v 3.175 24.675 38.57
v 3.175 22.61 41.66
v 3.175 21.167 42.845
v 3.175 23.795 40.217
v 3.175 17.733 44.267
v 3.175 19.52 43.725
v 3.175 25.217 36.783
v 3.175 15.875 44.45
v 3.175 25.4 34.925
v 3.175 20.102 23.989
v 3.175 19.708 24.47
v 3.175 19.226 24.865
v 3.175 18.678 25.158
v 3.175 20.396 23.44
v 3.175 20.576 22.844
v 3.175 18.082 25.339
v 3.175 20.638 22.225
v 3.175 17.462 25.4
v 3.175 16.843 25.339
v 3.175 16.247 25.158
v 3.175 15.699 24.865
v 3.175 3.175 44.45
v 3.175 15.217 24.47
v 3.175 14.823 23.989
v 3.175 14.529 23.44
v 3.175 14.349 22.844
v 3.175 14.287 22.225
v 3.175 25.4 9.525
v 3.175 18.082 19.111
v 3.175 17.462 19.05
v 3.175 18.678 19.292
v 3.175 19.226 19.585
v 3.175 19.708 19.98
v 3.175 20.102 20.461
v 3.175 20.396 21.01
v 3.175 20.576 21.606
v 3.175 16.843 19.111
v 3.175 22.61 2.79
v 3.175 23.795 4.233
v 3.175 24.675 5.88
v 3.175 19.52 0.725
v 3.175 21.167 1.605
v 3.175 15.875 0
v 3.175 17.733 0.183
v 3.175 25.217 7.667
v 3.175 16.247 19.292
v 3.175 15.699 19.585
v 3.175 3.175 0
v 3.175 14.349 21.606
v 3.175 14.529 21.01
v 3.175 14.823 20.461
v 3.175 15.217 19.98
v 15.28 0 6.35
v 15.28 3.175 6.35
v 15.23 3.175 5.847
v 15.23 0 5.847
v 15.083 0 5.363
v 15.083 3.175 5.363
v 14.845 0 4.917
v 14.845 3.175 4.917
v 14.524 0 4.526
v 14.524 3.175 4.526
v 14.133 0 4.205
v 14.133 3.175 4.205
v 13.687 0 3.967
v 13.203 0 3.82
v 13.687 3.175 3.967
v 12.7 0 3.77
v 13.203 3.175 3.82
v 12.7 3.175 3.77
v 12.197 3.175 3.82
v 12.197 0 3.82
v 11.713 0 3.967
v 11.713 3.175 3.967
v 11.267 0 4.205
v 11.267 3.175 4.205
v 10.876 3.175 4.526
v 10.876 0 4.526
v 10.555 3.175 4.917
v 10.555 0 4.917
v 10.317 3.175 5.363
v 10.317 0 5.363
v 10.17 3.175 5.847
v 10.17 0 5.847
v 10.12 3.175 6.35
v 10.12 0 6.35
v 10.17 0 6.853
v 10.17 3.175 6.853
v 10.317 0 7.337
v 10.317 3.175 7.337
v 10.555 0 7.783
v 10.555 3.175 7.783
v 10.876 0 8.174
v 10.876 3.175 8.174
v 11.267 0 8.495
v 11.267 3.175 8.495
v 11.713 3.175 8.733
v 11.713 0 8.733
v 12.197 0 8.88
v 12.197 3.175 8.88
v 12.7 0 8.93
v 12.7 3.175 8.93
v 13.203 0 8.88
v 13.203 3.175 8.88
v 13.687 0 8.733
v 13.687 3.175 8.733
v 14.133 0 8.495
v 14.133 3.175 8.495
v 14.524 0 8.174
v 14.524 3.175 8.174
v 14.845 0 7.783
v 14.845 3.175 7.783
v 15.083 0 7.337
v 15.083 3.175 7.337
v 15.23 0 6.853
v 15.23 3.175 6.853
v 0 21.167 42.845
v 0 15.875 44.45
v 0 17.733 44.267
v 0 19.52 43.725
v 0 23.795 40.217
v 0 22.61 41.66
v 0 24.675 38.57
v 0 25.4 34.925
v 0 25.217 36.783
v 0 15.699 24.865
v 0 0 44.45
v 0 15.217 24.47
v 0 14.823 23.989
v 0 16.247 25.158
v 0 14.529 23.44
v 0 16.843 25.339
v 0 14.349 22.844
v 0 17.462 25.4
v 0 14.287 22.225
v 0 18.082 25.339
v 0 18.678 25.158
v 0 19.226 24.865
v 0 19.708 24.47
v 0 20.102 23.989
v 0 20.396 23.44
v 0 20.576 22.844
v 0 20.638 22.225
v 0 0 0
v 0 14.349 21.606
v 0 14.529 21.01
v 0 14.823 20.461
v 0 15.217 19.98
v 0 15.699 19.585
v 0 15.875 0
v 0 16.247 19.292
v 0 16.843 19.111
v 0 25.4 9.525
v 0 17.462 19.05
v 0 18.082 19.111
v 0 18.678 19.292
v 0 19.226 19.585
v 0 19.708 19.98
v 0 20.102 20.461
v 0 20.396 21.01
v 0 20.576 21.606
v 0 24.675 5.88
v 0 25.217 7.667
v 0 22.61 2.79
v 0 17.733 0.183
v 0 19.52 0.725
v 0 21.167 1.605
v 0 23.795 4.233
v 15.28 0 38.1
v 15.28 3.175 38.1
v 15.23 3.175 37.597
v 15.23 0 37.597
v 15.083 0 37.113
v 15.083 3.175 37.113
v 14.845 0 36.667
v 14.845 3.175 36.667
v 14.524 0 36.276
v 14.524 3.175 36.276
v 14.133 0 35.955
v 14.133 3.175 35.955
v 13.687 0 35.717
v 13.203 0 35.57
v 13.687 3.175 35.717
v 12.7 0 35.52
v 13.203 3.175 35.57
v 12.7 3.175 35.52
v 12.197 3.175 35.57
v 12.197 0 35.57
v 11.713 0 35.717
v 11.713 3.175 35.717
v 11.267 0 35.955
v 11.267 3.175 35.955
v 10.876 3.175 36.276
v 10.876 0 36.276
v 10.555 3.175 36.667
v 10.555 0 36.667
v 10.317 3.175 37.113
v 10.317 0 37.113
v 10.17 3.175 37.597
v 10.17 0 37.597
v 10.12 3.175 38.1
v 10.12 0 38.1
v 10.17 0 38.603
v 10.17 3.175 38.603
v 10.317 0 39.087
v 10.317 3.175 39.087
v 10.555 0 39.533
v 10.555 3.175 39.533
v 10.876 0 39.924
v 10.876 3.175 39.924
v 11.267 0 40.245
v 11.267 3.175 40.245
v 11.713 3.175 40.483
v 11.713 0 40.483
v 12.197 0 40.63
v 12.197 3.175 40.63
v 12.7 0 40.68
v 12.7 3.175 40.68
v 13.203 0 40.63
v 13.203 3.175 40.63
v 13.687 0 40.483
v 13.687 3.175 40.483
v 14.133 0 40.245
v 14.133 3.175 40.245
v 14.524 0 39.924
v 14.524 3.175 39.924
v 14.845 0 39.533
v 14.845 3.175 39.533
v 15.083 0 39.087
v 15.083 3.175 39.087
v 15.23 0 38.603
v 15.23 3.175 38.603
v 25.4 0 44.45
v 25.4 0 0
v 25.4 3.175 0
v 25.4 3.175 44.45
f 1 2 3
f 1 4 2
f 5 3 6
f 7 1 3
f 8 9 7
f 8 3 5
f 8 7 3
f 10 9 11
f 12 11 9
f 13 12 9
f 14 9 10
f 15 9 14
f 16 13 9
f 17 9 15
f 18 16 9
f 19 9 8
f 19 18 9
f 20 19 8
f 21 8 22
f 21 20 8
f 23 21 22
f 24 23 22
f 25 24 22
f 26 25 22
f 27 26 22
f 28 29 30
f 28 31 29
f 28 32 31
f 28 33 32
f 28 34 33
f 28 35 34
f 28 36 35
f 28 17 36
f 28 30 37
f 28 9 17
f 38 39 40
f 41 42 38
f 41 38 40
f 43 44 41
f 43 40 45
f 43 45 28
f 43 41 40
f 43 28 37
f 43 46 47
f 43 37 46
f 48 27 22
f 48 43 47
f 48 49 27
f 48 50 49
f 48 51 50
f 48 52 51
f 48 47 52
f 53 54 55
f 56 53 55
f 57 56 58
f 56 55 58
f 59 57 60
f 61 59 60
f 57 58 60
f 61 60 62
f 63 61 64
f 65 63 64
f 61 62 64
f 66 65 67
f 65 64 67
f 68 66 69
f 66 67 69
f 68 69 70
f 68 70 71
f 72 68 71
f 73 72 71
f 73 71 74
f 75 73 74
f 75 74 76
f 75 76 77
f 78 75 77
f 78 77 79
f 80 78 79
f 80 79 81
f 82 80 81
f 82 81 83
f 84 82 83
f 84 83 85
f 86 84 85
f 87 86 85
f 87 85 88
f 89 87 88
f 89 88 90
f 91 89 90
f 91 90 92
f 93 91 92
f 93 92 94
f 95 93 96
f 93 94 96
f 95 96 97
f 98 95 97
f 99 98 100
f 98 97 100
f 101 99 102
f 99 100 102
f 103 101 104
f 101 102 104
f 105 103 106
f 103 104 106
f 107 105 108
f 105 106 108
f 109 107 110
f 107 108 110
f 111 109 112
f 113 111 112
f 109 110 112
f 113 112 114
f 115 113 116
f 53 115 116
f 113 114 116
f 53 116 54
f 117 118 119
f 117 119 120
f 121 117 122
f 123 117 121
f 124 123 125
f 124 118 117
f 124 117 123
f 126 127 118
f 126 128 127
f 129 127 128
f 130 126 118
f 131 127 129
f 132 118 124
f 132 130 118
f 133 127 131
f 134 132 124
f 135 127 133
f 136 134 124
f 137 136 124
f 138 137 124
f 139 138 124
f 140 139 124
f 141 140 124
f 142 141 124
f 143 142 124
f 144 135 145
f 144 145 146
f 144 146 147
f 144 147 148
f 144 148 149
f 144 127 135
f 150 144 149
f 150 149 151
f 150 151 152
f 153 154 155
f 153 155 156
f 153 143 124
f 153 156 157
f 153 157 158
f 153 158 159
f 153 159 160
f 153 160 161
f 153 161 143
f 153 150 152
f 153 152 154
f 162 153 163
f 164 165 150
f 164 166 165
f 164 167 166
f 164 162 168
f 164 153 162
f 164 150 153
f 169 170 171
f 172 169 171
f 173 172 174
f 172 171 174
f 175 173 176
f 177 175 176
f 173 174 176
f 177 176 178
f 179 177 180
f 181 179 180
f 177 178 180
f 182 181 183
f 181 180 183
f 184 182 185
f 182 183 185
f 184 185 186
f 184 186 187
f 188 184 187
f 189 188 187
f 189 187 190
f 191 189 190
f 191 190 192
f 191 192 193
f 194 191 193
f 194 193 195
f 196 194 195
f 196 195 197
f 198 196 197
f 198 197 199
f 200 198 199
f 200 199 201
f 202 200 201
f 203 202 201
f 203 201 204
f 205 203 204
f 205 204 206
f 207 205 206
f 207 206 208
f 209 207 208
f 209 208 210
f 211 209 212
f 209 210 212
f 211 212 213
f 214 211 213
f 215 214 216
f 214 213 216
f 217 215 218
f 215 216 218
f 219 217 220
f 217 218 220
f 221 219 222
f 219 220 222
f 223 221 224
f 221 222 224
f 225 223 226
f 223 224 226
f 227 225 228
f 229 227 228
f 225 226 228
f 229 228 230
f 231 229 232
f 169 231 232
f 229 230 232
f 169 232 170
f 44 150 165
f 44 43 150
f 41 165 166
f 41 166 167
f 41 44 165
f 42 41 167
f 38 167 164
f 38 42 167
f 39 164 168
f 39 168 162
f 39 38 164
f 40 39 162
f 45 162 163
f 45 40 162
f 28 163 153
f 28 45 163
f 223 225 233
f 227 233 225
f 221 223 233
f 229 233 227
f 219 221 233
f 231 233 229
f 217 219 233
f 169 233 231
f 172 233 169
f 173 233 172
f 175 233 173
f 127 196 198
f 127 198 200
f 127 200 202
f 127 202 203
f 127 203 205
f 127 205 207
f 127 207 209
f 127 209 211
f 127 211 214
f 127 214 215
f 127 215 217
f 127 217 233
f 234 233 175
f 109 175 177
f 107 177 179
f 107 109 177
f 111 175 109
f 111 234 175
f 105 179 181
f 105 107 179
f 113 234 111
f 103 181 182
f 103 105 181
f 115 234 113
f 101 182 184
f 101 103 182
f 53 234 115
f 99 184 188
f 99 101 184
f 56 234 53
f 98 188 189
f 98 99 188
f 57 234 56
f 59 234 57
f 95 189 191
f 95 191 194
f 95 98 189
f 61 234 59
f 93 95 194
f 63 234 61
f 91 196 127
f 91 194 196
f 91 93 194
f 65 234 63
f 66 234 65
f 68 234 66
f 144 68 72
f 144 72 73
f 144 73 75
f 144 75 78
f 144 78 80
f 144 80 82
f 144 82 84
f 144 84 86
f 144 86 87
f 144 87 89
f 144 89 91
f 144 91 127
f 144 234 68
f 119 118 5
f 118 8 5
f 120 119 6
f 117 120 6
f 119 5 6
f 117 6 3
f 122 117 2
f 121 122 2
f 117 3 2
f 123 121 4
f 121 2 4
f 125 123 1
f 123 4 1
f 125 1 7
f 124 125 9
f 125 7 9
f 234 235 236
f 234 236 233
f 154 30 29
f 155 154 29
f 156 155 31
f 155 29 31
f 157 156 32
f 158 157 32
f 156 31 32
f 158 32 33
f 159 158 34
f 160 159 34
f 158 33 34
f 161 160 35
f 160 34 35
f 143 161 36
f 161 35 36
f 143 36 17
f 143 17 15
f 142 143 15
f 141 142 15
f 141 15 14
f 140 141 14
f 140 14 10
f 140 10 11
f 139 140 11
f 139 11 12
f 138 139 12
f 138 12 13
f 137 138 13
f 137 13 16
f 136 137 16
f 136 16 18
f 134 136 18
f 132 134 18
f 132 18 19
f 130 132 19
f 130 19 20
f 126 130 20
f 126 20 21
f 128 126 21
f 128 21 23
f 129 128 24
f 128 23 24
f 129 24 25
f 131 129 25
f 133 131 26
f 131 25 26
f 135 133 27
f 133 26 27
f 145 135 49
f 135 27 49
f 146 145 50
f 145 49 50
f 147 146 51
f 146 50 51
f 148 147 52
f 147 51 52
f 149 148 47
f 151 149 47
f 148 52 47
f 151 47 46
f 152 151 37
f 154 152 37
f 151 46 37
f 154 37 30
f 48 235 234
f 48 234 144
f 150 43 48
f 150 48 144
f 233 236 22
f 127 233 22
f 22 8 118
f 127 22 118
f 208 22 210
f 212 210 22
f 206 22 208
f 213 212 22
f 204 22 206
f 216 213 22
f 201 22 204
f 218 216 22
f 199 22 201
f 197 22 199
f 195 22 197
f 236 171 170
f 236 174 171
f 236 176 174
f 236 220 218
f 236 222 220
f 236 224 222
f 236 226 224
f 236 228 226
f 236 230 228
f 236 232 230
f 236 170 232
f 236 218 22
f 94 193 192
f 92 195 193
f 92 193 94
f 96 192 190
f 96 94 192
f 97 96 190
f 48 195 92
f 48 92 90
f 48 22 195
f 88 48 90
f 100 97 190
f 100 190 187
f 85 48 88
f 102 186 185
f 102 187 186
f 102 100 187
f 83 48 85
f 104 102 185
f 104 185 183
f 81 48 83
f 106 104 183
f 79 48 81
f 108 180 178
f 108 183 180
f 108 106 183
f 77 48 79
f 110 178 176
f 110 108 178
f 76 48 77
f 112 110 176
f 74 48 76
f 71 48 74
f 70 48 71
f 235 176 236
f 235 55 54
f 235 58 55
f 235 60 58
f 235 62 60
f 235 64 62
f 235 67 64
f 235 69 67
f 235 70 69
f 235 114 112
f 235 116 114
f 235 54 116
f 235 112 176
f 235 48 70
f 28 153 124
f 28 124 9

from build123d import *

# Parameters (mm, degrees)
BOSS_EXTRUDE1_DEPTH              = 44.45
F_1_4_0_25_DIAMETER_HOLE2_D      = 6.35
FILLET1_R                        = 9.525
F_13_64_0_20313_DIAMETER_HOLE1_D = 5.159375


with BuildPart() as part:
    # Sketch1 → Boss-Extrude1 (new body)
    with BuildSketch(Plane.XY):
        Polygon((0, 0), (0, 25.4), (3.175, 25.4), (3.175, 3.175), (25.4, 3.175), (25.4, 0), align=None)
    extrude(amount=BOSS_EXTRUDE1_DEPTH)

    # 1/4 (0.25) Diameter Hole2 (through all)
    with Locations(Plane.ZY):
        with Locations((22.225, 17.4625)):
            Hole(F_1_4_0_25_DIAMETER_HOLE2_D / 2)

    # Fillet1
    fillet1_edges = [part.edges().sort_by_distance(p)[0] for p in [
        (1.5875, 25.4, 44.45),
        (1.5875, 25.4, 0),
    ]]
    fillet(fillet1_edges, radius=FILLET1_R)

    # 13/64 (0.20313) Diameter Hole1 (through all)
    with Locations(Plane(origin=(0, 0, 0), x_dir=(-1, 0, 0), z_dir=(0, -1, 0))):
        with Locations((-12.7, -38.1), (-12.7, -6.35)):
            Hole(F_13_64_0_20313_DIAMETER_HOLE1_D / 2)


solid = part.part
